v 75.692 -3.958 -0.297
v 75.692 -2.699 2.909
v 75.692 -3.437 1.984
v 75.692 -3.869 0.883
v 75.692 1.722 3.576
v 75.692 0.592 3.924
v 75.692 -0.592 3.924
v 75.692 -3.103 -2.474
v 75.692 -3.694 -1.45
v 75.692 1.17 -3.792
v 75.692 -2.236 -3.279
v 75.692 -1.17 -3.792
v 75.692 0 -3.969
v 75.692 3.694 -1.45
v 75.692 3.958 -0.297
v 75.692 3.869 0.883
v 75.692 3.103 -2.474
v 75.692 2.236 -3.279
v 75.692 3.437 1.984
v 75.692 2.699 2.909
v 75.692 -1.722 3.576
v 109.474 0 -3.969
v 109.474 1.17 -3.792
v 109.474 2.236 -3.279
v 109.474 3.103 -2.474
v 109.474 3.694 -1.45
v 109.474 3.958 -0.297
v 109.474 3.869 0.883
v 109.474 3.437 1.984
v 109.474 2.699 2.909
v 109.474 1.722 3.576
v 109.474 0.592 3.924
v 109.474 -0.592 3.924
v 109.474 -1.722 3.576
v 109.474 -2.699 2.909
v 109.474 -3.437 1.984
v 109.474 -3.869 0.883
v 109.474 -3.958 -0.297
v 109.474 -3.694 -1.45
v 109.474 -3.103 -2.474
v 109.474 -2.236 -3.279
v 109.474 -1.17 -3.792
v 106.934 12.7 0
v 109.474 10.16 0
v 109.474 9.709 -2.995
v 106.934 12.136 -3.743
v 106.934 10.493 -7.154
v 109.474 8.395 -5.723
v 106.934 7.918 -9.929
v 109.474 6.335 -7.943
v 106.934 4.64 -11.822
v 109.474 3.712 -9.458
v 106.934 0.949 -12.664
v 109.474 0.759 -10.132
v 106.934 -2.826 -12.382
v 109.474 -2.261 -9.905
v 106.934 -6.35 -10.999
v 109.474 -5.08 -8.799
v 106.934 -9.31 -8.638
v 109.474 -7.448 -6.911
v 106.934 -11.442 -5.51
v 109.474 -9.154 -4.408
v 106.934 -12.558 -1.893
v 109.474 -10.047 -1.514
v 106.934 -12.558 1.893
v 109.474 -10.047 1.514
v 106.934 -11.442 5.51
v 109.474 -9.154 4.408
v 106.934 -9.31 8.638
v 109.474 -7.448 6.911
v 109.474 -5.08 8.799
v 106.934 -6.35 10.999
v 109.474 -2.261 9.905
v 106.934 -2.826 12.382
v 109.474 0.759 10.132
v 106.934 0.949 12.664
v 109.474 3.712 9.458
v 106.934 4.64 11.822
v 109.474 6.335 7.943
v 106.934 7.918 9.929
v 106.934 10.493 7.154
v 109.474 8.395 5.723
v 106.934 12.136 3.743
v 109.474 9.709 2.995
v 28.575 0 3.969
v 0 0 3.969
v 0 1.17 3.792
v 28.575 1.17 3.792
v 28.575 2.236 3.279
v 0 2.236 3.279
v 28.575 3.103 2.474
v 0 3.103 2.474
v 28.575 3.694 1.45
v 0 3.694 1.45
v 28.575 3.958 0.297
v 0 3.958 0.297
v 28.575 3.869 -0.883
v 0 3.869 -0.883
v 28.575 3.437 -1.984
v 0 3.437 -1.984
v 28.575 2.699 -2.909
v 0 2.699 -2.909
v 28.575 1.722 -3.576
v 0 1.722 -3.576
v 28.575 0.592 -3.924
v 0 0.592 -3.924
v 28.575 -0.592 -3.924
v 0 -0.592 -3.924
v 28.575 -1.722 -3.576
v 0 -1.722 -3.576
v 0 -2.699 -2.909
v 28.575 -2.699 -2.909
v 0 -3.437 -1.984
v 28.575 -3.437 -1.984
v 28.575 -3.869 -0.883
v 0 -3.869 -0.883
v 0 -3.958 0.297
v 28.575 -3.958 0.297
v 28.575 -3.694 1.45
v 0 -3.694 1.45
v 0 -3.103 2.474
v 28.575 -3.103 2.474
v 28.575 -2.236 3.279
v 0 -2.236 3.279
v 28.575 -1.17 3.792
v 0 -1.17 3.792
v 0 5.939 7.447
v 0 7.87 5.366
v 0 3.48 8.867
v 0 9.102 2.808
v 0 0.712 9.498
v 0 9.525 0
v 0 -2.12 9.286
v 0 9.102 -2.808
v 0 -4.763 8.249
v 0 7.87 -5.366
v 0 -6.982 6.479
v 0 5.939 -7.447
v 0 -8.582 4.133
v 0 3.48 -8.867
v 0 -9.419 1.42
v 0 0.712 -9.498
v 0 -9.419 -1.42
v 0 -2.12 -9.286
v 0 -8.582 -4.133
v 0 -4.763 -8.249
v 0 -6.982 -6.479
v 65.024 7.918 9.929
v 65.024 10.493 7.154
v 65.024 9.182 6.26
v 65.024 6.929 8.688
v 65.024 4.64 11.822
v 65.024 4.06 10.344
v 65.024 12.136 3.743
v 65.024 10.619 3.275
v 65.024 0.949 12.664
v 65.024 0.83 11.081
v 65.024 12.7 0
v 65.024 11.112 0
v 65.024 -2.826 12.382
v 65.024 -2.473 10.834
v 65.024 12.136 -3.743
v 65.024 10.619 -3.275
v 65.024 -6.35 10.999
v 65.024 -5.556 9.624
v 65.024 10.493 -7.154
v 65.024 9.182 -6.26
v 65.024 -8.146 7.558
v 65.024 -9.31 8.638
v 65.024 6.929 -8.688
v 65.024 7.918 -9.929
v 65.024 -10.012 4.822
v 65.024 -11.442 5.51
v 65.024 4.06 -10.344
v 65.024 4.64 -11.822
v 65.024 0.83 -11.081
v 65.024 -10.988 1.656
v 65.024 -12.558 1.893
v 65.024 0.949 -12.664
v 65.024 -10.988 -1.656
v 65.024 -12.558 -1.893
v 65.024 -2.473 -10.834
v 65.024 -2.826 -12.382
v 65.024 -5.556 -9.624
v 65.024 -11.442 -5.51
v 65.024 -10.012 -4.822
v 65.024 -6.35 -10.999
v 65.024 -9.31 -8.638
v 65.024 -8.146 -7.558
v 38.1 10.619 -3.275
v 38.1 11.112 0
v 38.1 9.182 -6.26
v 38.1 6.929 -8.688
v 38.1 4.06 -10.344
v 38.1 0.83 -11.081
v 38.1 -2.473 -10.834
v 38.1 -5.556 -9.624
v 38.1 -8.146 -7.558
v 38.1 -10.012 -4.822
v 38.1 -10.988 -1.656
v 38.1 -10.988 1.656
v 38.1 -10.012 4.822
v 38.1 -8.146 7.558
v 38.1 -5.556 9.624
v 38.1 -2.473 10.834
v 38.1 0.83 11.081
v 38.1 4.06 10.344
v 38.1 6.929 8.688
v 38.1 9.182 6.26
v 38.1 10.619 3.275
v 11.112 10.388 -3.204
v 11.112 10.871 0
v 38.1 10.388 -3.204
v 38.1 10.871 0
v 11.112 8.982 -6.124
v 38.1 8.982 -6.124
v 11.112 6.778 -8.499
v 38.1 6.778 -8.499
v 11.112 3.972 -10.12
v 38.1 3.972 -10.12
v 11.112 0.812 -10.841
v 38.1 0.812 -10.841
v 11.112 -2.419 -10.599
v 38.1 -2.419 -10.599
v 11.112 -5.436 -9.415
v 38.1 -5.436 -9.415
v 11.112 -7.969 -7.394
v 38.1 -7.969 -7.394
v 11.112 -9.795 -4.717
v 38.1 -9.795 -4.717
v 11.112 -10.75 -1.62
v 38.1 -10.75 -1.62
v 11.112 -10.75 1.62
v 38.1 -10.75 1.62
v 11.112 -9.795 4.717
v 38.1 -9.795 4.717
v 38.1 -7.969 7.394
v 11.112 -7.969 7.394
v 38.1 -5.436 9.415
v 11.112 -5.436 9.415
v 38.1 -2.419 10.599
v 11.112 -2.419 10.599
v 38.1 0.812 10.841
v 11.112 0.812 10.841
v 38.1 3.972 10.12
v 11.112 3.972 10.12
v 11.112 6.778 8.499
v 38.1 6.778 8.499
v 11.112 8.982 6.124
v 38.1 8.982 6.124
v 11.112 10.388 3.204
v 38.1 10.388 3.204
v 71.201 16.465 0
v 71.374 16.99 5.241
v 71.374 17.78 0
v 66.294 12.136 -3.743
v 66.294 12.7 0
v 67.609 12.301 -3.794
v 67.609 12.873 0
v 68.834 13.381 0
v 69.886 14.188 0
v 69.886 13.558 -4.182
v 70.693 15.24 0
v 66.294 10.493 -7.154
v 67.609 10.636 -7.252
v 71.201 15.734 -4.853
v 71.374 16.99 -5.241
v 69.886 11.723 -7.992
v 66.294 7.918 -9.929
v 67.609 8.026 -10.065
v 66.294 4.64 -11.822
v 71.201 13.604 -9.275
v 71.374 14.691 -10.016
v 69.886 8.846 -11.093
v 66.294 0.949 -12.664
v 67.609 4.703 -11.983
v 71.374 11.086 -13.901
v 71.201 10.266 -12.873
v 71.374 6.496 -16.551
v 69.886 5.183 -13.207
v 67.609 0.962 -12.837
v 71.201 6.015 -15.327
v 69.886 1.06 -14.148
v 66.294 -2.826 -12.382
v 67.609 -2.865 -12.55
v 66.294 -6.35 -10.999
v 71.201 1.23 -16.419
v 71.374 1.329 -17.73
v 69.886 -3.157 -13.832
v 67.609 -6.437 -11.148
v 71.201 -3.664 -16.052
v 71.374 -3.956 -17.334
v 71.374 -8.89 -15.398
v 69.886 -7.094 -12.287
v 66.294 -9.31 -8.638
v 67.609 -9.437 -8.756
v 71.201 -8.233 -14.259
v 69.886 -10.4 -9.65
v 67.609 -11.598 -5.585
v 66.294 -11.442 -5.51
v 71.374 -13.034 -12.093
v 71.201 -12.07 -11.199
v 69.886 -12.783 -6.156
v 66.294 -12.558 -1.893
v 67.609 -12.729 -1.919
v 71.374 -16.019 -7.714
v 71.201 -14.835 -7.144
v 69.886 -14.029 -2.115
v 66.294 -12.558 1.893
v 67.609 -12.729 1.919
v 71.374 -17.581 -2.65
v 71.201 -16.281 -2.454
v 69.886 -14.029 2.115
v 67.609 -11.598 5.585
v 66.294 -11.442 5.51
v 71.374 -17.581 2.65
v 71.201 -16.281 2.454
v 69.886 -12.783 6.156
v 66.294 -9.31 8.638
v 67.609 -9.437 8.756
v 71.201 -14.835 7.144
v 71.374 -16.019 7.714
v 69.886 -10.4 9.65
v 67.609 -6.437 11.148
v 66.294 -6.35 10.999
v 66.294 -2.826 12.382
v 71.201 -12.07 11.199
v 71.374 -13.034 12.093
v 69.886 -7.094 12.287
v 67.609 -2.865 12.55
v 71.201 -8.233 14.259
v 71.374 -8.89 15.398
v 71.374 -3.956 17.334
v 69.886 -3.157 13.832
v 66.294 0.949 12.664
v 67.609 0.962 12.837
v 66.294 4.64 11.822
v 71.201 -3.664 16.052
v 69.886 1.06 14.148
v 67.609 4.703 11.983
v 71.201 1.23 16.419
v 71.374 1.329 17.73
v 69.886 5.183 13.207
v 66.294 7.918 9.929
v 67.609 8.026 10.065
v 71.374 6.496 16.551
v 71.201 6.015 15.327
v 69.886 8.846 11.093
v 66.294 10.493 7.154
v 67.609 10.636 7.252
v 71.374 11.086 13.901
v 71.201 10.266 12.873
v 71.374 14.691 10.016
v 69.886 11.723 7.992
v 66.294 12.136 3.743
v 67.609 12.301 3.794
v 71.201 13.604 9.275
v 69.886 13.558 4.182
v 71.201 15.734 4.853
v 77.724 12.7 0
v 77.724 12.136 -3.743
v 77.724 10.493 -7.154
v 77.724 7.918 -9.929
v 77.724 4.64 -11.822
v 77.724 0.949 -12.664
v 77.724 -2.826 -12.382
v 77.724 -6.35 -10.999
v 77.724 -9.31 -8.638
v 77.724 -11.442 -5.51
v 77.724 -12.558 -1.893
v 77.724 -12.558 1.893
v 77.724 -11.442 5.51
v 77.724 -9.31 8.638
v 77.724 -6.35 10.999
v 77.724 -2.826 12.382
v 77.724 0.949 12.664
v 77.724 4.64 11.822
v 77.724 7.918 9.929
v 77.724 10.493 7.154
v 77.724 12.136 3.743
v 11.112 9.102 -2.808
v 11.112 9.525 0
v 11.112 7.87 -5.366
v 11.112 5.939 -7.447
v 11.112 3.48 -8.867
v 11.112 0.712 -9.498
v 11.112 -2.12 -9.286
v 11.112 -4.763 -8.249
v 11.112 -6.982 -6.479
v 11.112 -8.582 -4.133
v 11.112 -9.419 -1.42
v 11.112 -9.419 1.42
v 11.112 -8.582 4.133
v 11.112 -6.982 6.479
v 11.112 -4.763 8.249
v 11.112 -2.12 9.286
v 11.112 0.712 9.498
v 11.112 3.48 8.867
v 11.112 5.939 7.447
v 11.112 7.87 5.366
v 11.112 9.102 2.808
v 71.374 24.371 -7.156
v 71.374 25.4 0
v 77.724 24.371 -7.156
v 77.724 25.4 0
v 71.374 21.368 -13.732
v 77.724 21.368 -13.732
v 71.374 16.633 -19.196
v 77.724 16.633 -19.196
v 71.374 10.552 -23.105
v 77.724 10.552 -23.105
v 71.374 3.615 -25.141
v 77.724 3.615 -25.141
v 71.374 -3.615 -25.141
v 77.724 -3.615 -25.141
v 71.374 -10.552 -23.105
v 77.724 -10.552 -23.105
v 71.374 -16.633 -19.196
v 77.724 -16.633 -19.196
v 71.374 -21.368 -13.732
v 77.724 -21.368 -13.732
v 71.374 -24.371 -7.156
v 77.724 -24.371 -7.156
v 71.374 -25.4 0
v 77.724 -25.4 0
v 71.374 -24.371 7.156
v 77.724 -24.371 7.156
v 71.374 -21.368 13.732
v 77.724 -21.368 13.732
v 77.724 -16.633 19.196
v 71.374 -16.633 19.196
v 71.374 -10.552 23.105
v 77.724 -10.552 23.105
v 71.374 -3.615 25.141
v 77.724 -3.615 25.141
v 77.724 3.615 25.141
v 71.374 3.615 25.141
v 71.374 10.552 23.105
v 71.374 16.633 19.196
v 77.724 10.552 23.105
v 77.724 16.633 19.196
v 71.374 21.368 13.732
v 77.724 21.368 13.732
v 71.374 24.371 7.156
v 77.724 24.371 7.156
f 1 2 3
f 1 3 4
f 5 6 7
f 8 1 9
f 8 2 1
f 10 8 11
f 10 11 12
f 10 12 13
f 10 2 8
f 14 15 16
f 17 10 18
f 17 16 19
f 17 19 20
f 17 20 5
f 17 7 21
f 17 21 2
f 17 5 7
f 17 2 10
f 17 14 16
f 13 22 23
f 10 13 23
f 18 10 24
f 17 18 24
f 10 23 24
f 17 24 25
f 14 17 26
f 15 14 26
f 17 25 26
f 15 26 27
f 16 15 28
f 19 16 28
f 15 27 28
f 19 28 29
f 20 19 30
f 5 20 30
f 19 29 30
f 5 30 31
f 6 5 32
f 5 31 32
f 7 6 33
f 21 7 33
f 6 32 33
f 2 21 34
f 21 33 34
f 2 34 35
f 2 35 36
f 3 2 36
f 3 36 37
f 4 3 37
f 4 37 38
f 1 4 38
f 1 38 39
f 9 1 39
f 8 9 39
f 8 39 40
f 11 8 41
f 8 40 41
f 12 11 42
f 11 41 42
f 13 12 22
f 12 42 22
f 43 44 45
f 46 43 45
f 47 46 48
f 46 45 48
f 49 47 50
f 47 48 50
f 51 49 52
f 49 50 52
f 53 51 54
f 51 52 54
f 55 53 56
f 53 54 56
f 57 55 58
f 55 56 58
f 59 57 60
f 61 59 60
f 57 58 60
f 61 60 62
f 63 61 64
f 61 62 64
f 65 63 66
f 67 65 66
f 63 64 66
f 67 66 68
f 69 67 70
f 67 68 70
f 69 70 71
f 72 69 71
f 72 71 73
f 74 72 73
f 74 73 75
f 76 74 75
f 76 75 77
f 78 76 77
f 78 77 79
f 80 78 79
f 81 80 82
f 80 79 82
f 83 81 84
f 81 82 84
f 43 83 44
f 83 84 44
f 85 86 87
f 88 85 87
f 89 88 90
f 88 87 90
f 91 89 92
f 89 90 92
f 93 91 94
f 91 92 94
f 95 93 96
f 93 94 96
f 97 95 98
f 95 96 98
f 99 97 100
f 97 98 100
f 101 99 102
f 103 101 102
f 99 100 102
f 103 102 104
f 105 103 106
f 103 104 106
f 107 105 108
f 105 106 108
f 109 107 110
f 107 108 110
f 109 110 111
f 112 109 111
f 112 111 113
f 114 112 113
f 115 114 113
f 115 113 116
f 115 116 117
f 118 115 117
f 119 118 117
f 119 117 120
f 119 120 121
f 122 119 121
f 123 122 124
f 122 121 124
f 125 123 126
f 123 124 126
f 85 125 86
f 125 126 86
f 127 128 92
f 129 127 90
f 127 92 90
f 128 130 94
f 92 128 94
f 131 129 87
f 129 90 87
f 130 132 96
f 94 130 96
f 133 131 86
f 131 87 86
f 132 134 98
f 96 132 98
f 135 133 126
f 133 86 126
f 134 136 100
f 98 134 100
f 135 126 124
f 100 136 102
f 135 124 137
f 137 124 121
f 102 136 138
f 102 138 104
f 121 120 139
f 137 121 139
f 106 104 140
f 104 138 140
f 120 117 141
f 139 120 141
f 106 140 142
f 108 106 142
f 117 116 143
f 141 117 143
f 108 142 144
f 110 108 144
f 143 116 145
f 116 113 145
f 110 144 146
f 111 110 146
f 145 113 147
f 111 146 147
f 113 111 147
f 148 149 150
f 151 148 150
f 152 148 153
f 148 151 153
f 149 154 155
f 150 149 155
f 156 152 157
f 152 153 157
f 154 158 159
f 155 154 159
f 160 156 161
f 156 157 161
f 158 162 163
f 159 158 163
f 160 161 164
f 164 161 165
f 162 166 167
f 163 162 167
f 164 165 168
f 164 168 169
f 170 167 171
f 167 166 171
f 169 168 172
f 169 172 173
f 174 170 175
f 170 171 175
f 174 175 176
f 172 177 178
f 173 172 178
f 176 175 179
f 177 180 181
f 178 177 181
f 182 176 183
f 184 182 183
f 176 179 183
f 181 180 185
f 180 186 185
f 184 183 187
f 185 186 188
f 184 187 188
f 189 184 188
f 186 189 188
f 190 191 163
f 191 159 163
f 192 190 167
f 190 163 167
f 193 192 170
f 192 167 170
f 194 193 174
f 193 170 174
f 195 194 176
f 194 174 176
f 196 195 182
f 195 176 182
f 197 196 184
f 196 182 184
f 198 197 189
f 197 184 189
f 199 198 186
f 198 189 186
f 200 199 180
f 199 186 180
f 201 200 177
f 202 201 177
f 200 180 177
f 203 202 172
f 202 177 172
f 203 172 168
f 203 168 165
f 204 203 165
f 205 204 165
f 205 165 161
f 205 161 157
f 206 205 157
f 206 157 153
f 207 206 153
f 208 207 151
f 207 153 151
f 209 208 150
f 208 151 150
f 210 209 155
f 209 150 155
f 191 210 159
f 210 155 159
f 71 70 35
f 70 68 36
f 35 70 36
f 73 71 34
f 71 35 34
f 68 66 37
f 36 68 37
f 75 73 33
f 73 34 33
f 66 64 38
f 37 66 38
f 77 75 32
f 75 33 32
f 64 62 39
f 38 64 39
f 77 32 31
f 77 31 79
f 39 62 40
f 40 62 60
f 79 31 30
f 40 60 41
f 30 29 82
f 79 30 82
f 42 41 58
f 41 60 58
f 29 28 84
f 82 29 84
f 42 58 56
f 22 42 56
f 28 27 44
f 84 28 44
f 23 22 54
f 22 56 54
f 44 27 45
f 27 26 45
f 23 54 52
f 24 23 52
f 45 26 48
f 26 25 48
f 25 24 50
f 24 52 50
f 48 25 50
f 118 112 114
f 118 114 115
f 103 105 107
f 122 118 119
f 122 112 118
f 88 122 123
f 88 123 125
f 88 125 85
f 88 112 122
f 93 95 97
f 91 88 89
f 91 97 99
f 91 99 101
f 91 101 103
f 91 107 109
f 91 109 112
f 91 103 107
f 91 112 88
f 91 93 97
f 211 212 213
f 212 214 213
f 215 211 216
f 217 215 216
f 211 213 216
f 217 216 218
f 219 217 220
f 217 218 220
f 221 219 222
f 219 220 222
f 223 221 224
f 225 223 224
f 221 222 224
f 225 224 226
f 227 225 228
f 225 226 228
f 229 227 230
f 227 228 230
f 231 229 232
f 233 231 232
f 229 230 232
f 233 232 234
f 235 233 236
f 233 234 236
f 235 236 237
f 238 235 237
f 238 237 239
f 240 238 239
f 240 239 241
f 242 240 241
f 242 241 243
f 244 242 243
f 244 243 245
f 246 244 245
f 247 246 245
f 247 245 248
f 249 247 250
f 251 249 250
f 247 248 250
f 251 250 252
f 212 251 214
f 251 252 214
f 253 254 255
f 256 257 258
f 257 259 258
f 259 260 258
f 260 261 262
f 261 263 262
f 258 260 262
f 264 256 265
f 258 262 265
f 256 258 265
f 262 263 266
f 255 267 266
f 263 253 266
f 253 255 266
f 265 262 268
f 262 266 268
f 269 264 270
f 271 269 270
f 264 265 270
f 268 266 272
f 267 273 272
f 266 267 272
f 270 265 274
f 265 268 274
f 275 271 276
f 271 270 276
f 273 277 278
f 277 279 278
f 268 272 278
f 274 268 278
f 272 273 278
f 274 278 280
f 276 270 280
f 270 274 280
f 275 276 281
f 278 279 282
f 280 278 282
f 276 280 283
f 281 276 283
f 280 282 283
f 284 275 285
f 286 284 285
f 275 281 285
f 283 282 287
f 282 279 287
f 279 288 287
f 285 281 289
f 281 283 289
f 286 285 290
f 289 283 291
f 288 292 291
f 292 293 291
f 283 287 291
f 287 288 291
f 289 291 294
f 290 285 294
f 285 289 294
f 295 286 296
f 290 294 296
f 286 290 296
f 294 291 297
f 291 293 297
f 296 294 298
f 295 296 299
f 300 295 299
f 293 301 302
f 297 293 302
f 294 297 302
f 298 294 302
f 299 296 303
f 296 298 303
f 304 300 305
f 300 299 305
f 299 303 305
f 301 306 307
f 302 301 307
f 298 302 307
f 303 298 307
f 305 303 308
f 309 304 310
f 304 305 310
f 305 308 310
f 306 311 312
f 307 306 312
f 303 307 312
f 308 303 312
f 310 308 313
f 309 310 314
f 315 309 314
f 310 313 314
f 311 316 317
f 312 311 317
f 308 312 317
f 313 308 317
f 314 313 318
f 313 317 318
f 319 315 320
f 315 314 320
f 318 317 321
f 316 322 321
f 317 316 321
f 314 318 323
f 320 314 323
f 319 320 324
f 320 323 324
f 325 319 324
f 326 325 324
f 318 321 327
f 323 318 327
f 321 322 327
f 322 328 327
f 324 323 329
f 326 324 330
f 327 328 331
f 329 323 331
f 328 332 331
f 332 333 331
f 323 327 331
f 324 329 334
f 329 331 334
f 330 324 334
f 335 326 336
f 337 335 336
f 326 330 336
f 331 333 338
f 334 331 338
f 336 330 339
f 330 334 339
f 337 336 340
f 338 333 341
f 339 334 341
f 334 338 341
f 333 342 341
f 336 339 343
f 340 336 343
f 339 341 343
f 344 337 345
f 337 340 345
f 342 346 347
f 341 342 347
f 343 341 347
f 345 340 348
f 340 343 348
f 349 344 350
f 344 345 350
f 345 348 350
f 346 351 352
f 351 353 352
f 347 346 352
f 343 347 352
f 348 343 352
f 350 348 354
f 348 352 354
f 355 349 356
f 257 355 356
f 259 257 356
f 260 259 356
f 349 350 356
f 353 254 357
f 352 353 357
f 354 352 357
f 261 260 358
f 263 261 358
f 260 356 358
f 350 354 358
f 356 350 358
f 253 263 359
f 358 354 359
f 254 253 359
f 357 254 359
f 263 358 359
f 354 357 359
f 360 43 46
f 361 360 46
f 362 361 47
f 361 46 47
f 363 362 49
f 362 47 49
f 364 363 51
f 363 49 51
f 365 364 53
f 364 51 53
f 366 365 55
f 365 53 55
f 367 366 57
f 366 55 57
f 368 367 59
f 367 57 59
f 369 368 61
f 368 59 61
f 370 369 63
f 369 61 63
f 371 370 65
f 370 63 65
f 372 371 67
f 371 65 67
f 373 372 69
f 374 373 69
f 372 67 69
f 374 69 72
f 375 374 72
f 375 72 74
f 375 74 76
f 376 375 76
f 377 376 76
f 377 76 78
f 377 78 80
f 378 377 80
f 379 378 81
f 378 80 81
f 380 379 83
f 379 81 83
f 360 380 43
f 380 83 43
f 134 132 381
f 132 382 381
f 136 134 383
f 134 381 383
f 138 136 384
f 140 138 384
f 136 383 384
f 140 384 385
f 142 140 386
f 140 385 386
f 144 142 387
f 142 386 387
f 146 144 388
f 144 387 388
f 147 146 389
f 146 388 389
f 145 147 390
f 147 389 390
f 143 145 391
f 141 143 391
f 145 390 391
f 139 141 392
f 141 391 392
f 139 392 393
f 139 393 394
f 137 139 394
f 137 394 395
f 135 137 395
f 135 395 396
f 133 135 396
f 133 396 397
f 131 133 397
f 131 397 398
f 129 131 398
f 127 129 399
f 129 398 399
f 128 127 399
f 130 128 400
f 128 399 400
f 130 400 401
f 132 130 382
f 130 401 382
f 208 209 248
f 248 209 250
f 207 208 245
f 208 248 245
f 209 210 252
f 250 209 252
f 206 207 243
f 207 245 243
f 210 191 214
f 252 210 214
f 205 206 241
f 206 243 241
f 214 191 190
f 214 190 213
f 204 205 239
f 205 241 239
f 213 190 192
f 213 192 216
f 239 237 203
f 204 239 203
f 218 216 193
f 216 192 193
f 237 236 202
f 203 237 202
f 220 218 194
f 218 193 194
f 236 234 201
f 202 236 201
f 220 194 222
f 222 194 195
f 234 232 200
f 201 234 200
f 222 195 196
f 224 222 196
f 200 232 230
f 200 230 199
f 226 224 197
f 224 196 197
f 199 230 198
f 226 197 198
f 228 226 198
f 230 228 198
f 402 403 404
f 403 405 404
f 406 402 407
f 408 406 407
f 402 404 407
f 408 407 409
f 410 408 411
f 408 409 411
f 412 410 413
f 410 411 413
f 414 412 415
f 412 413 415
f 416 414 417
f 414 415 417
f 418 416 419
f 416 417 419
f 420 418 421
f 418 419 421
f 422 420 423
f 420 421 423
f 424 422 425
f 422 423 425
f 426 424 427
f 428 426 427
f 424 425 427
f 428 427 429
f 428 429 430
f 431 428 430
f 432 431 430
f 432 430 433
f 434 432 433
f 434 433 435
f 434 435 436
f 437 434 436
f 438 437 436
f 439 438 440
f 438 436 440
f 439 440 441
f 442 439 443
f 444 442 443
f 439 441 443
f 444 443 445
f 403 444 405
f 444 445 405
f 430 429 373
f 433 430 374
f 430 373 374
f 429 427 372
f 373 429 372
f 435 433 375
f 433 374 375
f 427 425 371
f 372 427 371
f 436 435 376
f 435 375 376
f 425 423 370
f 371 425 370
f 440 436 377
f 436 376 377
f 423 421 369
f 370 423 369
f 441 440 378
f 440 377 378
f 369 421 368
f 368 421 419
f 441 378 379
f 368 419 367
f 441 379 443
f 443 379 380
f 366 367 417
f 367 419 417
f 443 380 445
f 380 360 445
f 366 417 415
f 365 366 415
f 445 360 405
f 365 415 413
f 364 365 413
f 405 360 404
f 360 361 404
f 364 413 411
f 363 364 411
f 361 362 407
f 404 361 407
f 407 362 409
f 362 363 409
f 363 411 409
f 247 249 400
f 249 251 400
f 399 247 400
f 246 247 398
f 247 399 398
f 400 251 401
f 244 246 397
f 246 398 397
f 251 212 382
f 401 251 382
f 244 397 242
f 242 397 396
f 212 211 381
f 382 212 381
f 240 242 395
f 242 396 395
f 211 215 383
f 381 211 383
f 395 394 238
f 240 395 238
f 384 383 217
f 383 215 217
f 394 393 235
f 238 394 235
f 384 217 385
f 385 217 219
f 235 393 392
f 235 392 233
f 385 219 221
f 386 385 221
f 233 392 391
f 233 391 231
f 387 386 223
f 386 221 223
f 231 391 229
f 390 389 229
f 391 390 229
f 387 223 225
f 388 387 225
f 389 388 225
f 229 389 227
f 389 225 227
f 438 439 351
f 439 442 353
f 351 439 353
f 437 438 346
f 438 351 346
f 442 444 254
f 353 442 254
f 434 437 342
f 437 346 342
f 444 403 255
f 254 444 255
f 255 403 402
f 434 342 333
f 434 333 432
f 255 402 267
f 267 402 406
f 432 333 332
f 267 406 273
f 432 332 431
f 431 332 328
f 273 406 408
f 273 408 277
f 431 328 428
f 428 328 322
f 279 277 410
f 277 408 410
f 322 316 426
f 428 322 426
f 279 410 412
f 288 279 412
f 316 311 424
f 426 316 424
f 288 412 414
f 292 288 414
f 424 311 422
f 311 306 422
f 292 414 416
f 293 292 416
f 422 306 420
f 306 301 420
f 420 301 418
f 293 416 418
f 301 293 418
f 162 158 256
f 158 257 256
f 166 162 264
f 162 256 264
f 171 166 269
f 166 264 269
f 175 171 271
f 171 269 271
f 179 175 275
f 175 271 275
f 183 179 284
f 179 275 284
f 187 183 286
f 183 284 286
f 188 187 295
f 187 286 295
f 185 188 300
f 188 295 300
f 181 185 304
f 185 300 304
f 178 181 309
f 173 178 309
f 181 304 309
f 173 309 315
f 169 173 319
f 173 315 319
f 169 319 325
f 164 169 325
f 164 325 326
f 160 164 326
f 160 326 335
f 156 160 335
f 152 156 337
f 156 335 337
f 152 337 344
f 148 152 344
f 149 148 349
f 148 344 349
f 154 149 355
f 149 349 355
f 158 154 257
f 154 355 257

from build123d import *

# Parameters (mm, degrees)
SKETCH5_R          = 3.96875
CUT_EXTRUDE1_DEPTH = 28.575
SKETCH6_R          = 3.96875
CUT_EXTRUDE2_DEPTH = 33.782
CHAMFER1_SIZE      = 2.54


with BuildPart() as part:
    # Sketch4 → Revolve2 (revolve)
    with BuildSketch(Plane.XY):
        with BuildLine():
            Line((0, 0), (0, 9.525))
            Line((0, 9.525), (11.1125, 9.525))
            Line((11.1125, 9.525), (11.1125, 10.8712))
            Line((11.1125, 10.8712), (38.1, 10.8712))
            Line((38.1, 10.8712), (38.1, 11.1125))
            Line((38.1, 11.1125), (65.024, 11.1125))
            Line((65.024, 11.1125), (65.024, 12.7))
            Line((65.024, 12.7), (66.294, 12.7))
            ThreePointArc((66.294, 12.7), (69.886102448, 14.187897552), (71.374, 17.78))
            Line((71.374, 17.78), (71.374, 25.4))
            Line((71.374, 25.4), (77.724, 25.4))
            Line((77.724, 25.4), (77.724, 12.7))
            Line((77.724, 12.7), (109.474, 12.7))
            Line((109.474, 12.7), (109.474, 0))
            Line((109.474, 0), (0, 0))
        make_face()
    revolve(axis=Axis((109.474, 0, 0), (-1, 0, 0)))

    # Sketch5 → Cut-Extrude1 (cut)
    with BuildSketch(Plane.ZY):
        Circle(SKETCH5_R)
    extrude(amount=-CUT_EXTRUDE1_DEPTH, mode=Mode.SUBTRACT)

    # Sketch6 → Cut-Extrude2 (cut)
    with BuildSketch(Plane(origin=(109.474, 0, 0), x_dir=(0, 0, -1), z_dir=(1, 0, 0))):
        Circle(SKETCH6_R)
    extrude(amount=-CUT_EXTRUDE2_DEPTH, mode=Mode.SUBTRACT)

    # Chamfer1
    chamfer1_edges = [part.edges().sort_by_distance(p)[0] for p in [
        (109.474, -12.7, 0),
    ]]
    chamfer(chamfer1_edges, length=CHAMFER1_SIZE)


solid = part.part
